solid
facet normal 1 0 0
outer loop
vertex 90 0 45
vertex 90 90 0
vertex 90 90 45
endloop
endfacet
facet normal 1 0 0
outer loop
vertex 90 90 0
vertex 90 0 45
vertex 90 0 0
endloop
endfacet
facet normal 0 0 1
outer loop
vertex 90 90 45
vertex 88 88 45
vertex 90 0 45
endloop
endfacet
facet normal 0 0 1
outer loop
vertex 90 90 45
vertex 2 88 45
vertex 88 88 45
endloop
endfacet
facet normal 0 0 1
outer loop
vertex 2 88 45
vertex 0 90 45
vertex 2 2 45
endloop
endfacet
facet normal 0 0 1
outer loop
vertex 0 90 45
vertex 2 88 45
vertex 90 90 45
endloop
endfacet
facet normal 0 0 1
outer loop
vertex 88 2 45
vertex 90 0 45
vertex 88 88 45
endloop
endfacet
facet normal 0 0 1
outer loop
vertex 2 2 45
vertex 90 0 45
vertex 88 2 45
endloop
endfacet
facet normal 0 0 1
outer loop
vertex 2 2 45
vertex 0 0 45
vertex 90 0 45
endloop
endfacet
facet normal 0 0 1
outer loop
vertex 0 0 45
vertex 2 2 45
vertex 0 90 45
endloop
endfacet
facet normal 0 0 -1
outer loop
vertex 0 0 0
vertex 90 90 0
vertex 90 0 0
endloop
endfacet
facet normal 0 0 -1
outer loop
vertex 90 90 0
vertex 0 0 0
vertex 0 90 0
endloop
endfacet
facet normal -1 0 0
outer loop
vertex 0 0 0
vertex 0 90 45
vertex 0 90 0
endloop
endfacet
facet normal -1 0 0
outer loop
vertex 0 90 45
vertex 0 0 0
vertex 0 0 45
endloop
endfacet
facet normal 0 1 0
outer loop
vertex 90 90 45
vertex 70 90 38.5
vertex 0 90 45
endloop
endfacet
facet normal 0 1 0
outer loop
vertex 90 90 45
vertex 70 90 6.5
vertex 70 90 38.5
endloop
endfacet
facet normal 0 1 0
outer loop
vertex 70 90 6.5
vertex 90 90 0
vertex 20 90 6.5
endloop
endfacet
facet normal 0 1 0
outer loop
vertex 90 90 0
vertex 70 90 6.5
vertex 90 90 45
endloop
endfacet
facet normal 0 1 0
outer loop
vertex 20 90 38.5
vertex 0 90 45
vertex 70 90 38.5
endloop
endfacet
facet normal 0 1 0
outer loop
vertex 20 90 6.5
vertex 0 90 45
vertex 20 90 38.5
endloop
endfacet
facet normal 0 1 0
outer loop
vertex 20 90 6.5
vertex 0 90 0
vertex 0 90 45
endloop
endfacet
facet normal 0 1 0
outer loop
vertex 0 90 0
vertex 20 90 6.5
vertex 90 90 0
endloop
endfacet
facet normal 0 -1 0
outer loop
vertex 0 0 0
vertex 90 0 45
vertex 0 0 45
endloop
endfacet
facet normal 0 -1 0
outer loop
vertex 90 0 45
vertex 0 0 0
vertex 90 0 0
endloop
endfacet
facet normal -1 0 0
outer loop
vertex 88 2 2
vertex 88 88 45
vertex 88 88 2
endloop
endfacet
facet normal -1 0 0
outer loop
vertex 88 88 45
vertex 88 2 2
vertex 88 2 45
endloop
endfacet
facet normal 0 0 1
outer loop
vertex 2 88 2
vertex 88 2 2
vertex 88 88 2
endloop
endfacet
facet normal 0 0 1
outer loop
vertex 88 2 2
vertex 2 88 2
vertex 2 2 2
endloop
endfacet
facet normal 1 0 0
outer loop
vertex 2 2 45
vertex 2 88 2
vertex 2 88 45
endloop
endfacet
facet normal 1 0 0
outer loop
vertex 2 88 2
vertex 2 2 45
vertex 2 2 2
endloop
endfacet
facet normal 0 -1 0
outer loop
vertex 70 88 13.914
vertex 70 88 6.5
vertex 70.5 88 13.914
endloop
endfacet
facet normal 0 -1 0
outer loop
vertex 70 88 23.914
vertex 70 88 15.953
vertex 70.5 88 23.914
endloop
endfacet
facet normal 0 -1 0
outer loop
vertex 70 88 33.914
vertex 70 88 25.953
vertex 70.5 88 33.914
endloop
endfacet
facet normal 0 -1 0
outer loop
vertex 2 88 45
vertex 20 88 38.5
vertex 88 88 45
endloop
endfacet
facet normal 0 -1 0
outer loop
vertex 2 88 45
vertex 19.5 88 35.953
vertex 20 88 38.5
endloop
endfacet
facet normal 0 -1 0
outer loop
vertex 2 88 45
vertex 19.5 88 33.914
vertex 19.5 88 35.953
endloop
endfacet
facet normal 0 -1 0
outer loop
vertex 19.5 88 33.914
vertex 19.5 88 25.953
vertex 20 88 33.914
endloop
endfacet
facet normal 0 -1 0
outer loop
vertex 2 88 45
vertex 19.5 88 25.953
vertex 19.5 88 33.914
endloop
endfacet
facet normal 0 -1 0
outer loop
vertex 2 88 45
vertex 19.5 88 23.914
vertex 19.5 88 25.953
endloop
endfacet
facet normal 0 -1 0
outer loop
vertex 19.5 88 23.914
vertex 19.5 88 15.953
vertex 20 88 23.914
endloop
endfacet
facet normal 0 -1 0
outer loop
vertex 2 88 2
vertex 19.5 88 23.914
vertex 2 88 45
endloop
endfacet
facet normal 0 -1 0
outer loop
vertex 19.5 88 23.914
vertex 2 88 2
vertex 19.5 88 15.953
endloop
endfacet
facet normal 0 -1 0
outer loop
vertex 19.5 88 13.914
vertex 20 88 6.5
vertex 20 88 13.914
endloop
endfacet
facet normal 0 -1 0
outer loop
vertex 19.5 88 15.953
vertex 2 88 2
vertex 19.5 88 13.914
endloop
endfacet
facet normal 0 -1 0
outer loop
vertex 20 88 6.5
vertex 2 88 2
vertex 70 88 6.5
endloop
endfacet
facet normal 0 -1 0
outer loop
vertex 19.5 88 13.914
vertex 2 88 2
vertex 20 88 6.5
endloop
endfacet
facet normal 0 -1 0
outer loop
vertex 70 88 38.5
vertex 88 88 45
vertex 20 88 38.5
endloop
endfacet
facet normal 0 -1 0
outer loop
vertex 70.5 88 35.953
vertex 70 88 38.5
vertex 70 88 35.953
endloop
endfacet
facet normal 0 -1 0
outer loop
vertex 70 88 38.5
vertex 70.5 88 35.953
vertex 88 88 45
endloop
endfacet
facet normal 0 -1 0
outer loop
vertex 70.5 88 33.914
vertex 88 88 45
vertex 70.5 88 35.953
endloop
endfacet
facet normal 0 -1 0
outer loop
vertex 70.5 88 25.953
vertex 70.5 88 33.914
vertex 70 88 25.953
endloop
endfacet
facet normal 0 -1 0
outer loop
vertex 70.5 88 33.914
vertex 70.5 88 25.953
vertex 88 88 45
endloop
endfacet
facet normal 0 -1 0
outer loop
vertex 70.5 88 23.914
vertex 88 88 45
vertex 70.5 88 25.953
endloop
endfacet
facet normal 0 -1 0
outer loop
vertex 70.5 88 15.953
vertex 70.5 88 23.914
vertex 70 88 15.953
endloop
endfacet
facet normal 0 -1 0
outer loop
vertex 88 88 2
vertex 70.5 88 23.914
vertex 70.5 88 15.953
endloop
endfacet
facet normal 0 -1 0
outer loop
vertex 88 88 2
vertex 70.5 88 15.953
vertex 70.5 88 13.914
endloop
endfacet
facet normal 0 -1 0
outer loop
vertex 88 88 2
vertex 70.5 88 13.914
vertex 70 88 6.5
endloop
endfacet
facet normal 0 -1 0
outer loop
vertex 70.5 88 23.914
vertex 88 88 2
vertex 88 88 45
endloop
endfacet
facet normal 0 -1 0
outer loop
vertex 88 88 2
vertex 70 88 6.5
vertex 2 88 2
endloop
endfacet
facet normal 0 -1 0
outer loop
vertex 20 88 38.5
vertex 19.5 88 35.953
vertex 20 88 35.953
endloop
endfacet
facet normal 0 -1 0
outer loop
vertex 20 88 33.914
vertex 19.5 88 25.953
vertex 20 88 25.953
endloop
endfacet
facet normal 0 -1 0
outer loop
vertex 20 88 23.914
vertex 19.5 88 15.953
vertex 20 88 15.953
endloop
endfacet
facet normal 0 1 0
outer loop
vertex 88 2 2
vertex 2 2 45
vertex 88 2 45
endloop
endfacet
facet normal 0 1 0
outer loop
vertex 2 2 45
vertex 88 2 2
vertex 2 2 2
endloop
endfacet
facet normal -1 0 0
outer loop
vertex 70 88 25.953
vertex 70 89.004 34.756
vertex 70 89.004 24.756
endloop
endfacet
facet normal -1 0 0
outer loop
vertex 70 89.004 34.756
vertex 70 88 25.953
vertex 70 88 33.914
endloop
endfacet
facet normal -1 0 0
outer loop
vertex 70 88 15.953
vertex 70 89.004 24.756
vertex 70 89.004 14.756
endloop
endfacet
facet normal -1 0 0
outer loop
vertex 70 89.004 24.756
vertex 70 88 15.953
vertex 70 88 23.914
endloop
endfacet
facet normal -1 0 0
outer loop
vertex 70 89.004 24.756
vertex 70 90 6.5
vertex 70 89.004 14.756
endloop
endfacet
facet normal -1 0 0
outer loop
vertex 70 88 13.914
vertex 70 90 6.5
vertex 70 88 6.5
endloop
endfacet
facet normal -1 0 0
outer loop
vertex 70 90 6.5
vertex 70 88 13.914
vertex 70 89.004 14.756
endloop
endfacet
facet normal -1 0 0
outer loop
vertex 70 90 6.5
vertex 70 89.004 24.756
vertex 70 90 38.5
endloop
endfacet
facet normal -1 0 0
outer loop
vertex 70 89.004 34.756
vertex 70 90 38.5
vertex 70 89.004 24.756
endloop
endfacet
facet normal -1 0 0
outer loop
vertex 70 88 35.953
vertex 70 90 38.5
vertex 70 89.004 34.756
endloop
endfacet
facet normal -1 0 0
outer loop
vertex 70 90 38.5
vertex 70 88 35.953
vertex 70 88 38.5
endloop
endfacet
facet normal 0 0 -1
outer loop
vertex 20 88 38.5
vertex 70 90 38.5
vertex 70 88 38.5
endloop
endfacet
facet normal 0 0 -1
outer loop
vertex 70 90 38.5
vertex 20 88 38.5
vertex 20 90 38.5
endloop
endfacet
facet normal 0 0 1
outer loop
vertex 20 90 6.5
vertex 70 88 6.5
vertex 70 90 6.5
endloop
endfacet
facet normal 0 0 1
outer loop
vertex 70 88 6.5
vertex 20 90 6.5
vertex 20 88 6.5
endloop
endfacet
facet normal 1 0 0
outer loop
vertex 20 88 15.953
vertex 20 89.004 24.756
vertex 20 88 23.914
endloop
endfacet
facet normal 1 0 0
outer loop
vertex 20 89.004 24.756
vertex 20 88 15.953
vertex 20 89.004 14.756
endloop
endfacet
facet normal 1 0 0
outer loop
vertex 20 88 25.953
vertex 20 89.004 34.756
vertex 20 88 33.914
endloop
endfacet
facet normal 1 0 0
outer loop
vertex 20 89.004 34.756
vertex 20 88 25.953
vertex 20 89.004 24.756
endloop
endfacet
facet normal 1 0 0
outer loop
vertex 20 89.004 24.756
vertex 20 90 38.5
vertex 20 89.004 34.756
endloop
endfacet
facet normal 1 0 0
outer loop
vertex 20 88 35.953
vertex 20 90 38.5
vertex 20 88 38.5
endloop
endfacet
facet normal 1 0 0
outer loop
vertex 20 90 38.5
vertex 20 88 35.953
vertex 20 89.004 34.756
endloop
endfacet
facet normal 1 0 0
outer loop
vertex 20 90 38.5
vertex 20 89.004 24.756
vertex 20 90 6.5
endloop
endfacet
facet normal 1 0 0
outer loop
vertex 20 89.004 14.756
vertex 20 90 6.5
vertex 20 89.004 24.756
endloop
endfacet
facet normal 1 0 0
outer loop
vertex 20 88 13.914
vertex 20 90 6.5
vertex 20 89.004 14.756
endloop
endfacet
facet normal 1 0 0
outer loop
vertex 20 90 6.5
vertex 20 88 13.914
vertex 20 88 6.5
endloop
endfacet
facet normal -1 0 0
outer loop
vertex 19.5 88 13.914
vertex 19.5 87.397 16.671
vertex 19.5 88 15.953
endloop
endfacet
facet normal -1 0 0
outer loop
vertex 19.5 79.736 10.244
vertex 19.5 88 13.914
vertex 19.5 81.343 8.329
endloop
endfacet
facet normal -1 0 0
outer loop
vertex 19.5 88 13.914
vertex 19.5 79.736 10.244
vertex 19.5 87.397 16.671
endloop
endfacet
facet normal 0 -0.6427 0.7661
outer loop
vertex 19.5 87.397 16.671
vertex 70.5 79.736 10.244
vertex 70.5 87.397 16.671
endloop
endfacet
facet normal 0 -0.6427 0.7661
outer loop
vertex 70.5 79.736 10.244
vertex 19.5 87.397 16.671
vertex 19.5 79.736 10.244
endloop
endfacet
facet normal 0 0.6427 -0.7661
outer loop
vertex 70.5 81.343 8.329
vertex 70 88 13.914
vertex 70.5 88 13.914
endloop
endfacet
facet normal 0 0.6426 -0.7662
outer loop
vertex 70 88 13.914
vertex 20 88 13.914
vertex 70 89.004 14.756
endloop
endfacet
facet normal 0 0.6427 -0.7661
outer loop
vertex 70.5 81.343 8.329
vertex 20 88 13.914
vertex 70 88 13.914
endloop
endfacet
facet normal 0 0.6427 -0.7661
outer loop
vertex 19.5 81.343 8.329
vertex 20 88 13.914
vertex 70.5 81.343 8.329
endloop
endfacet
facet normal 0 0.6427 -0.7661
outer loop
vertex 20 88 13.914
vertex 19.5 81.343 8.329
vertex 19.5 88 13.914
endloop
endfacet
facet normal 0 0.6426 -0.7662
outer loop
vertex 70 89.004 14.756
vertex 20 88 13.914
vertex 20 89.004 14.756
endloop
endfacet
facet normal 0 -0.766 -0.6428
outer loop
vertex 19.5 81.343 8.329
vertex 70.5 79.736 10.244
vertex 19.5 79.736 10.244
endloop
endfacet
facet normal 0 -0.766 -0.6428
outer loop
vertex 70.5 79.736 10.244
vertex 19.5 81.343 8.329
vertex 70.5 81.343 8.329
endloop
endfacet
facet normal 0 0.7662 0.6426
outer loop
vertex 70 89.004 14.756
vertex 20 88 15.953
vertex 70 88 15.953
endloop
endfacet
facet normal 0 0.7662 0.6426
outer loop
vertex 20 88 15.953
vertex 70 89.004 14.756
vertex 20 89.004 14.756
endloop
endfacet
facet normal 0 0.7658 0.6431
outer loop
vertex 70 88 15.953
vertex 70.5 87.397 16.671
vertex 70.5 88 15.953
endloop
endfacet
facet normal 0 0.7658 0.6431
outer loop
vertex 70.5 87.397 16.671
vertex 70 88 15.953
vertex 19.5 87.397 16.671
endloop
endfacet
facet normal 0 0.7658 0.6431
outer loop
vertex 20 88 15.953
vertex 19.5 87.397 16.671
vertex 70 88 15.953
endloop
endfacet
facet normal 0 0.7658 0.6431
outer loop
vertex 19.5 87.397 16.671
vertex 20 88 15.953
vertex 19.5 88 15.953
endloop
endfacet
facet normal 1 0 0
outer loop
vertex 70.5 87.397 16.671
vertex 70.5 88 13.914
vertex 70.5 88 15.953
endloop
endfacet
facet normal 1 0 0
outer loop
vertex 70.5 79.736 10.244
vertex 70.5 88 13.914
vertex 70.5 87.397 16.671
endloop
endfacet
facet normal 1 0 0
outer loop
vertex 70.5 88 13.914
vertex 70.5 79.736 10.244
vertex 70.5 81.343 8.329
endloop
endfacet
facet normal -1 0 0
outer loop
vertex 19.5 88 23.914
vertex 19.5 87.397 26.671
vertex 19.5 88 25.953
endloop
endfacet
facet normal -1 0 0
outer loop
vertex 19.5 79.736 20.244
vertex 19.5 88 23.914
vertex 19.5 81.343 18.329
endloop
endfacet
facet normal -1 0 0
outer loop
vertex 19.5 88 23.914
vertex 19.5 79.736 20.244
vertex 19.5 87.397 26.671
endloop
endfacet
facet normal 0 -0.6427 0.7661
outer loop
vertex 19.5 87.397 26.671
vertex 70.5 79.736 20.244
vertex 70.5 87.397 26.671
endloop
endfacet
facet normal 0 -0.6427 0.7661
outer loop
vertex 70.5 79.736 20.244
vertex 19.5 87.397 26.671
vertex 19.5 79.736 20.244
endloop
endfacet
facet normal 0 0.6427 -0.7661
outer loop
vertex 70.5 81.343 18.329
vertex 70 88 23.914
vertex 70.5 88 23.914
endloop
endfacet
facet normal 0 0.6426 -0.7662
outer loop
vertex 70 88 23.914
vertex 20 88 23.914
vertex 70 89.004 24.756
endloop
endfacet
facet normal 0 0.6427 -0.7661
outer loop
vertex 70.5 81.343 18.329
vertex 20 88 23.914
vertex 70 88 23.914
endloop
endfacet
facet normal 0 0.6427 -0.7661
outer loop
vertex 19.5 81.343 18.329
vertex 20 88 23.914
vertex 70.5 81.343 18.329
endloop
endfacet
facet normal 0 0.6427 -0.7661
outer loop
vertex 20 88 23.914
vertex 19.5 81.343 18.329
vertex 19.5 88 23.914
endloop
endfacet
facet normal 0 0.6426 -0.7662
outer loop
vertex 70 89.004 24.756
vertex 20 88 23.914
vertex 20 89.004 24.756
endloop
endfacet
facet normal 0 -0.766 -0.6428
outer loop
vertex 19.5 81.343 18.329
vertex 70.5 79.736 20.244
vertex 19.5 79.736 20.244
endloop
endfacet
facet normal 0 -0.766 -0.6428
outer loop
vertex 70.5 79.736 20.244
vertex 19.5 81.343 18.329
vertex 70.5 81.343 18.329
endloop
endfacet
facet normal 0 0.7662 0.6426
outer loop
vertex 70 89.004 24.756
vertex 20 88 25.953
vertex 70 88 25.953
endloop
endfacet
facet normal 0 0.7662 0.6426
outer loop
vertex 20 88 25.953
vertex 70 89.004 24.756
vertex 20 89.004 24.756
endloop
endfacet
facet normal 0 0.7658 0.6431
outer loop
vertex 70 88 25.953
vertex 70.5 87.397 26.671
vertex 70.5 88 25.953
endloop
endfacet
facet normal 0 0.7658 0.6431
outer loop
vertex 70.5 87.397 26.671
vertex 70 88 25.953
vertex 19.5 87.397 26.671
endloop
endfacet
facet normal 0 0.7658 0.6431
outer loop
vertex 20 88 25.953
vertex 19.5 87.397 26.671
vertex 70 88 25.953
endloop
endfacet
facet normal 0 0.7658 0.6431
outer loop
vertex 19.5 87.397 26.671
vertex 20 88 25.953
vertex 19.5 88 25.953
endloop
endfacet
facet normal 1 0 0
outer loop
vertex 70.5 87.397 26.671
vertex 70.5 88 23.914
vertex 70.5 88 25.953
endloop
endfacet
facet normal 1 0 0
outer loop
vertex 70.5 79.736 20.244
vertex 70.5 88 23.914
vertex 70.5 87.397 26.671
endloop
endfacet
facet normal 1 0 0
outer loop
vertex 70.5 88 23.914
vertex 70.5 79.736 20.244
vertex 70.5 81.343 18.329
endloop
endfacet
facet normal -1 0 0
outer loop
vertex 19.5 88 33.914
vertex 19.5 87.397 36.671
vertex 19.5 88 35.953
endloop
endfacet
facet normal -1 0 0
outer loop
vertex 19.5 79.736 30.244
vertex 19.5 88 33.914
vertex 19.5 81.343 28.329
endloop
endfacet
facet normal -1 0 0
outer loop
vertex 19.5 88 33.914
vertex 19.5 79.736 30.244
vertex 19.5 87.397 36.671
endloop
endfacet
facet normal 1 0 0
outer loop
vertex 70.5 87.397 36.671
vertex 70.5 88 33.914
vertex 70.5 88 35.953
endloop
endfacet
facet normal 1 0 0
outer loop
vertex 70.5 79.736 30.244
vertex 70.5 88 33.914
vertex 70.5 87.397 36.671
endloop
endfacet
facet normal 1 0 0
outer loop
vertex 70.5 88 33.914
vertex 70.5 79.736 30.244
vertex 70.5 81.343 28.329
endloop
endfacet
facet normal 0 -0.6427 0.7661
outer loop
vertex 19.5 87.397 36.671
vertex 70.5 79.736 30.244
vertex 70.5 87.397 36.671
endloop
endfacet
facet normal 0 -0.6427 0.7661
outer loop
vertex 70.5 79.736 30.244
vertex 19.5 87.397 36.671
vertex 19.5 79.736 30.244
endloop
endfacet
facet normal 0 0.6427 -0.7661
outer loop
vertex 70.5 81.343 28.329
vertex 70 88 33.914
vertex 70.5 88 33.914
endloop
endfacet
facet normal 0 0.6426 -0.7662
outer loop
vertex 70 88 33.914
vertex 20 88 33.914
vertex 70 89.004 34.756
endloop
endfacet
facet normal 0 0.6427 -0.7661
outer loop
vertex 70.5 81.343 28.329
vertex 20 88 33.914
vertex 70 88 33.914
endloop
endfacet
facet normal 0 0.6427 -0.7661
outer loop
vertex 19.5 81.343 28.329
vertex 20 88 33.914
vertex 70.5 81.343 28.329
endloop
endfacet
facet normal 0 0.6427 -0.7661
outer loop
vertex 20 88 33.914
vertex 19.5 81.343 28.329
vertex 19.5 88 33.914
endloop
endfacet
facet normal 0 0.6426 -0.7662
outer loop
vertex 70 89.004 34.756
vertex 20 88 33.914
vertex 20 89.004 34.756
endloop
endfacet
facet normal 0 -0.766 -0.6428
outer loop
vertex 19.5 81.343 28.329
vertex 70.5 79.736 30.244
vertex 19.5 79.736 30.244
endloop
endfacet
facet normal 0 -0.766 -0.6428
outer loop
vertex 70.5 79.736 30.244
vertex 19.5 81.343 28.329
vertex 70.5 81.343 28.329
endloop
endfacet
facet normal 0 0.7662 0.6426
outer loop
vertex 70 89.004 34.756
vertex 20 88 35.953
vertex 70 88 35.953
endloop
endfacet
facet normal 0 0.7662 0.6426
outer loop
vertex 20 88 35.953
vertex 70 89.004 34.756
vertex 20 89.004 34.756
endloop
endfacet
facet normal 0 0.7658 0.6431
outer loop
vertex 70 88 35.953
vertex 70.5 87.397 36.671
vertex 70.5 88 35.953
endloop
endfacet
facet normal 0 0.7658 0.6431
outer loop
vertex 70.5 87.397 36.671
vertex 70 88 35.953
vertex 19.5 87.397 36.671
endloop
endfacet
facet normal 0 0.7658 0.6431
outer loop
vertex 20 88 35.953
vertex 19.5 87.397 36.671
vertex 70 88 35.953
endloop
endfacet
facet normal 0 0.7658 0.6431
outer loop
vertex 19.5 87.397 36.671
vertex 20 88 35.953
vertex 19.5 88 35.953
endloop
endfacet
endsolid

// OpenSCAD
$fn = 32;

// ----------------------------------------------------------------------
// Vent box: louvers enclosure
// ----------------------------------------------------------------------

// --- parameters (mm) ---
box_l = 90;               // box length, X
box_w = 90;               // box width, Y
box_h = 45;               // box height, Z
wall_t = 2;               // shell wall thickness
win_l = 50;               // vent window width, X
win_h = 32;               // vent window height, Z
slat_t = 2.5;             // louver slat thickness
slat_d = 10;              // louver slat depth
slat_a = 40;              // louver slat angle, degrees
slat_pitch = 10;          // louver pitch
slat_yc = 84.37;          // slat centreline Y

win_z0 = (box_h - win_h) / 2;  // window lower edge Z
n_slats = 3;  // louver count
slat_z0 = win_z0 + (win_h - (n_slats - 1) * slat_pitch) / 2;

difference() {
  union() {
    difference() {
      cube([box_l, box_w, box_h]);
  translate([wall_t, wall_t, wall_t])
    cube([box_l - 2 * wall_t, box_w - 2 * wall_t, box_h]);
  translate([(box_l - win_l) / 2, box_w - wall_t - 1, win_z0])
    cube([win_l, wall_t + 2, win_h]);
    }
    for (i = [0 : n_slats - 1])
      translate([box_l / 2, slat_yc, slat_z0 + i * slat_pitch])
        rotate([slat_a, 0, 0])
          cube([win_l + 1, slat_d, slat_t], center = true);
  }
}
